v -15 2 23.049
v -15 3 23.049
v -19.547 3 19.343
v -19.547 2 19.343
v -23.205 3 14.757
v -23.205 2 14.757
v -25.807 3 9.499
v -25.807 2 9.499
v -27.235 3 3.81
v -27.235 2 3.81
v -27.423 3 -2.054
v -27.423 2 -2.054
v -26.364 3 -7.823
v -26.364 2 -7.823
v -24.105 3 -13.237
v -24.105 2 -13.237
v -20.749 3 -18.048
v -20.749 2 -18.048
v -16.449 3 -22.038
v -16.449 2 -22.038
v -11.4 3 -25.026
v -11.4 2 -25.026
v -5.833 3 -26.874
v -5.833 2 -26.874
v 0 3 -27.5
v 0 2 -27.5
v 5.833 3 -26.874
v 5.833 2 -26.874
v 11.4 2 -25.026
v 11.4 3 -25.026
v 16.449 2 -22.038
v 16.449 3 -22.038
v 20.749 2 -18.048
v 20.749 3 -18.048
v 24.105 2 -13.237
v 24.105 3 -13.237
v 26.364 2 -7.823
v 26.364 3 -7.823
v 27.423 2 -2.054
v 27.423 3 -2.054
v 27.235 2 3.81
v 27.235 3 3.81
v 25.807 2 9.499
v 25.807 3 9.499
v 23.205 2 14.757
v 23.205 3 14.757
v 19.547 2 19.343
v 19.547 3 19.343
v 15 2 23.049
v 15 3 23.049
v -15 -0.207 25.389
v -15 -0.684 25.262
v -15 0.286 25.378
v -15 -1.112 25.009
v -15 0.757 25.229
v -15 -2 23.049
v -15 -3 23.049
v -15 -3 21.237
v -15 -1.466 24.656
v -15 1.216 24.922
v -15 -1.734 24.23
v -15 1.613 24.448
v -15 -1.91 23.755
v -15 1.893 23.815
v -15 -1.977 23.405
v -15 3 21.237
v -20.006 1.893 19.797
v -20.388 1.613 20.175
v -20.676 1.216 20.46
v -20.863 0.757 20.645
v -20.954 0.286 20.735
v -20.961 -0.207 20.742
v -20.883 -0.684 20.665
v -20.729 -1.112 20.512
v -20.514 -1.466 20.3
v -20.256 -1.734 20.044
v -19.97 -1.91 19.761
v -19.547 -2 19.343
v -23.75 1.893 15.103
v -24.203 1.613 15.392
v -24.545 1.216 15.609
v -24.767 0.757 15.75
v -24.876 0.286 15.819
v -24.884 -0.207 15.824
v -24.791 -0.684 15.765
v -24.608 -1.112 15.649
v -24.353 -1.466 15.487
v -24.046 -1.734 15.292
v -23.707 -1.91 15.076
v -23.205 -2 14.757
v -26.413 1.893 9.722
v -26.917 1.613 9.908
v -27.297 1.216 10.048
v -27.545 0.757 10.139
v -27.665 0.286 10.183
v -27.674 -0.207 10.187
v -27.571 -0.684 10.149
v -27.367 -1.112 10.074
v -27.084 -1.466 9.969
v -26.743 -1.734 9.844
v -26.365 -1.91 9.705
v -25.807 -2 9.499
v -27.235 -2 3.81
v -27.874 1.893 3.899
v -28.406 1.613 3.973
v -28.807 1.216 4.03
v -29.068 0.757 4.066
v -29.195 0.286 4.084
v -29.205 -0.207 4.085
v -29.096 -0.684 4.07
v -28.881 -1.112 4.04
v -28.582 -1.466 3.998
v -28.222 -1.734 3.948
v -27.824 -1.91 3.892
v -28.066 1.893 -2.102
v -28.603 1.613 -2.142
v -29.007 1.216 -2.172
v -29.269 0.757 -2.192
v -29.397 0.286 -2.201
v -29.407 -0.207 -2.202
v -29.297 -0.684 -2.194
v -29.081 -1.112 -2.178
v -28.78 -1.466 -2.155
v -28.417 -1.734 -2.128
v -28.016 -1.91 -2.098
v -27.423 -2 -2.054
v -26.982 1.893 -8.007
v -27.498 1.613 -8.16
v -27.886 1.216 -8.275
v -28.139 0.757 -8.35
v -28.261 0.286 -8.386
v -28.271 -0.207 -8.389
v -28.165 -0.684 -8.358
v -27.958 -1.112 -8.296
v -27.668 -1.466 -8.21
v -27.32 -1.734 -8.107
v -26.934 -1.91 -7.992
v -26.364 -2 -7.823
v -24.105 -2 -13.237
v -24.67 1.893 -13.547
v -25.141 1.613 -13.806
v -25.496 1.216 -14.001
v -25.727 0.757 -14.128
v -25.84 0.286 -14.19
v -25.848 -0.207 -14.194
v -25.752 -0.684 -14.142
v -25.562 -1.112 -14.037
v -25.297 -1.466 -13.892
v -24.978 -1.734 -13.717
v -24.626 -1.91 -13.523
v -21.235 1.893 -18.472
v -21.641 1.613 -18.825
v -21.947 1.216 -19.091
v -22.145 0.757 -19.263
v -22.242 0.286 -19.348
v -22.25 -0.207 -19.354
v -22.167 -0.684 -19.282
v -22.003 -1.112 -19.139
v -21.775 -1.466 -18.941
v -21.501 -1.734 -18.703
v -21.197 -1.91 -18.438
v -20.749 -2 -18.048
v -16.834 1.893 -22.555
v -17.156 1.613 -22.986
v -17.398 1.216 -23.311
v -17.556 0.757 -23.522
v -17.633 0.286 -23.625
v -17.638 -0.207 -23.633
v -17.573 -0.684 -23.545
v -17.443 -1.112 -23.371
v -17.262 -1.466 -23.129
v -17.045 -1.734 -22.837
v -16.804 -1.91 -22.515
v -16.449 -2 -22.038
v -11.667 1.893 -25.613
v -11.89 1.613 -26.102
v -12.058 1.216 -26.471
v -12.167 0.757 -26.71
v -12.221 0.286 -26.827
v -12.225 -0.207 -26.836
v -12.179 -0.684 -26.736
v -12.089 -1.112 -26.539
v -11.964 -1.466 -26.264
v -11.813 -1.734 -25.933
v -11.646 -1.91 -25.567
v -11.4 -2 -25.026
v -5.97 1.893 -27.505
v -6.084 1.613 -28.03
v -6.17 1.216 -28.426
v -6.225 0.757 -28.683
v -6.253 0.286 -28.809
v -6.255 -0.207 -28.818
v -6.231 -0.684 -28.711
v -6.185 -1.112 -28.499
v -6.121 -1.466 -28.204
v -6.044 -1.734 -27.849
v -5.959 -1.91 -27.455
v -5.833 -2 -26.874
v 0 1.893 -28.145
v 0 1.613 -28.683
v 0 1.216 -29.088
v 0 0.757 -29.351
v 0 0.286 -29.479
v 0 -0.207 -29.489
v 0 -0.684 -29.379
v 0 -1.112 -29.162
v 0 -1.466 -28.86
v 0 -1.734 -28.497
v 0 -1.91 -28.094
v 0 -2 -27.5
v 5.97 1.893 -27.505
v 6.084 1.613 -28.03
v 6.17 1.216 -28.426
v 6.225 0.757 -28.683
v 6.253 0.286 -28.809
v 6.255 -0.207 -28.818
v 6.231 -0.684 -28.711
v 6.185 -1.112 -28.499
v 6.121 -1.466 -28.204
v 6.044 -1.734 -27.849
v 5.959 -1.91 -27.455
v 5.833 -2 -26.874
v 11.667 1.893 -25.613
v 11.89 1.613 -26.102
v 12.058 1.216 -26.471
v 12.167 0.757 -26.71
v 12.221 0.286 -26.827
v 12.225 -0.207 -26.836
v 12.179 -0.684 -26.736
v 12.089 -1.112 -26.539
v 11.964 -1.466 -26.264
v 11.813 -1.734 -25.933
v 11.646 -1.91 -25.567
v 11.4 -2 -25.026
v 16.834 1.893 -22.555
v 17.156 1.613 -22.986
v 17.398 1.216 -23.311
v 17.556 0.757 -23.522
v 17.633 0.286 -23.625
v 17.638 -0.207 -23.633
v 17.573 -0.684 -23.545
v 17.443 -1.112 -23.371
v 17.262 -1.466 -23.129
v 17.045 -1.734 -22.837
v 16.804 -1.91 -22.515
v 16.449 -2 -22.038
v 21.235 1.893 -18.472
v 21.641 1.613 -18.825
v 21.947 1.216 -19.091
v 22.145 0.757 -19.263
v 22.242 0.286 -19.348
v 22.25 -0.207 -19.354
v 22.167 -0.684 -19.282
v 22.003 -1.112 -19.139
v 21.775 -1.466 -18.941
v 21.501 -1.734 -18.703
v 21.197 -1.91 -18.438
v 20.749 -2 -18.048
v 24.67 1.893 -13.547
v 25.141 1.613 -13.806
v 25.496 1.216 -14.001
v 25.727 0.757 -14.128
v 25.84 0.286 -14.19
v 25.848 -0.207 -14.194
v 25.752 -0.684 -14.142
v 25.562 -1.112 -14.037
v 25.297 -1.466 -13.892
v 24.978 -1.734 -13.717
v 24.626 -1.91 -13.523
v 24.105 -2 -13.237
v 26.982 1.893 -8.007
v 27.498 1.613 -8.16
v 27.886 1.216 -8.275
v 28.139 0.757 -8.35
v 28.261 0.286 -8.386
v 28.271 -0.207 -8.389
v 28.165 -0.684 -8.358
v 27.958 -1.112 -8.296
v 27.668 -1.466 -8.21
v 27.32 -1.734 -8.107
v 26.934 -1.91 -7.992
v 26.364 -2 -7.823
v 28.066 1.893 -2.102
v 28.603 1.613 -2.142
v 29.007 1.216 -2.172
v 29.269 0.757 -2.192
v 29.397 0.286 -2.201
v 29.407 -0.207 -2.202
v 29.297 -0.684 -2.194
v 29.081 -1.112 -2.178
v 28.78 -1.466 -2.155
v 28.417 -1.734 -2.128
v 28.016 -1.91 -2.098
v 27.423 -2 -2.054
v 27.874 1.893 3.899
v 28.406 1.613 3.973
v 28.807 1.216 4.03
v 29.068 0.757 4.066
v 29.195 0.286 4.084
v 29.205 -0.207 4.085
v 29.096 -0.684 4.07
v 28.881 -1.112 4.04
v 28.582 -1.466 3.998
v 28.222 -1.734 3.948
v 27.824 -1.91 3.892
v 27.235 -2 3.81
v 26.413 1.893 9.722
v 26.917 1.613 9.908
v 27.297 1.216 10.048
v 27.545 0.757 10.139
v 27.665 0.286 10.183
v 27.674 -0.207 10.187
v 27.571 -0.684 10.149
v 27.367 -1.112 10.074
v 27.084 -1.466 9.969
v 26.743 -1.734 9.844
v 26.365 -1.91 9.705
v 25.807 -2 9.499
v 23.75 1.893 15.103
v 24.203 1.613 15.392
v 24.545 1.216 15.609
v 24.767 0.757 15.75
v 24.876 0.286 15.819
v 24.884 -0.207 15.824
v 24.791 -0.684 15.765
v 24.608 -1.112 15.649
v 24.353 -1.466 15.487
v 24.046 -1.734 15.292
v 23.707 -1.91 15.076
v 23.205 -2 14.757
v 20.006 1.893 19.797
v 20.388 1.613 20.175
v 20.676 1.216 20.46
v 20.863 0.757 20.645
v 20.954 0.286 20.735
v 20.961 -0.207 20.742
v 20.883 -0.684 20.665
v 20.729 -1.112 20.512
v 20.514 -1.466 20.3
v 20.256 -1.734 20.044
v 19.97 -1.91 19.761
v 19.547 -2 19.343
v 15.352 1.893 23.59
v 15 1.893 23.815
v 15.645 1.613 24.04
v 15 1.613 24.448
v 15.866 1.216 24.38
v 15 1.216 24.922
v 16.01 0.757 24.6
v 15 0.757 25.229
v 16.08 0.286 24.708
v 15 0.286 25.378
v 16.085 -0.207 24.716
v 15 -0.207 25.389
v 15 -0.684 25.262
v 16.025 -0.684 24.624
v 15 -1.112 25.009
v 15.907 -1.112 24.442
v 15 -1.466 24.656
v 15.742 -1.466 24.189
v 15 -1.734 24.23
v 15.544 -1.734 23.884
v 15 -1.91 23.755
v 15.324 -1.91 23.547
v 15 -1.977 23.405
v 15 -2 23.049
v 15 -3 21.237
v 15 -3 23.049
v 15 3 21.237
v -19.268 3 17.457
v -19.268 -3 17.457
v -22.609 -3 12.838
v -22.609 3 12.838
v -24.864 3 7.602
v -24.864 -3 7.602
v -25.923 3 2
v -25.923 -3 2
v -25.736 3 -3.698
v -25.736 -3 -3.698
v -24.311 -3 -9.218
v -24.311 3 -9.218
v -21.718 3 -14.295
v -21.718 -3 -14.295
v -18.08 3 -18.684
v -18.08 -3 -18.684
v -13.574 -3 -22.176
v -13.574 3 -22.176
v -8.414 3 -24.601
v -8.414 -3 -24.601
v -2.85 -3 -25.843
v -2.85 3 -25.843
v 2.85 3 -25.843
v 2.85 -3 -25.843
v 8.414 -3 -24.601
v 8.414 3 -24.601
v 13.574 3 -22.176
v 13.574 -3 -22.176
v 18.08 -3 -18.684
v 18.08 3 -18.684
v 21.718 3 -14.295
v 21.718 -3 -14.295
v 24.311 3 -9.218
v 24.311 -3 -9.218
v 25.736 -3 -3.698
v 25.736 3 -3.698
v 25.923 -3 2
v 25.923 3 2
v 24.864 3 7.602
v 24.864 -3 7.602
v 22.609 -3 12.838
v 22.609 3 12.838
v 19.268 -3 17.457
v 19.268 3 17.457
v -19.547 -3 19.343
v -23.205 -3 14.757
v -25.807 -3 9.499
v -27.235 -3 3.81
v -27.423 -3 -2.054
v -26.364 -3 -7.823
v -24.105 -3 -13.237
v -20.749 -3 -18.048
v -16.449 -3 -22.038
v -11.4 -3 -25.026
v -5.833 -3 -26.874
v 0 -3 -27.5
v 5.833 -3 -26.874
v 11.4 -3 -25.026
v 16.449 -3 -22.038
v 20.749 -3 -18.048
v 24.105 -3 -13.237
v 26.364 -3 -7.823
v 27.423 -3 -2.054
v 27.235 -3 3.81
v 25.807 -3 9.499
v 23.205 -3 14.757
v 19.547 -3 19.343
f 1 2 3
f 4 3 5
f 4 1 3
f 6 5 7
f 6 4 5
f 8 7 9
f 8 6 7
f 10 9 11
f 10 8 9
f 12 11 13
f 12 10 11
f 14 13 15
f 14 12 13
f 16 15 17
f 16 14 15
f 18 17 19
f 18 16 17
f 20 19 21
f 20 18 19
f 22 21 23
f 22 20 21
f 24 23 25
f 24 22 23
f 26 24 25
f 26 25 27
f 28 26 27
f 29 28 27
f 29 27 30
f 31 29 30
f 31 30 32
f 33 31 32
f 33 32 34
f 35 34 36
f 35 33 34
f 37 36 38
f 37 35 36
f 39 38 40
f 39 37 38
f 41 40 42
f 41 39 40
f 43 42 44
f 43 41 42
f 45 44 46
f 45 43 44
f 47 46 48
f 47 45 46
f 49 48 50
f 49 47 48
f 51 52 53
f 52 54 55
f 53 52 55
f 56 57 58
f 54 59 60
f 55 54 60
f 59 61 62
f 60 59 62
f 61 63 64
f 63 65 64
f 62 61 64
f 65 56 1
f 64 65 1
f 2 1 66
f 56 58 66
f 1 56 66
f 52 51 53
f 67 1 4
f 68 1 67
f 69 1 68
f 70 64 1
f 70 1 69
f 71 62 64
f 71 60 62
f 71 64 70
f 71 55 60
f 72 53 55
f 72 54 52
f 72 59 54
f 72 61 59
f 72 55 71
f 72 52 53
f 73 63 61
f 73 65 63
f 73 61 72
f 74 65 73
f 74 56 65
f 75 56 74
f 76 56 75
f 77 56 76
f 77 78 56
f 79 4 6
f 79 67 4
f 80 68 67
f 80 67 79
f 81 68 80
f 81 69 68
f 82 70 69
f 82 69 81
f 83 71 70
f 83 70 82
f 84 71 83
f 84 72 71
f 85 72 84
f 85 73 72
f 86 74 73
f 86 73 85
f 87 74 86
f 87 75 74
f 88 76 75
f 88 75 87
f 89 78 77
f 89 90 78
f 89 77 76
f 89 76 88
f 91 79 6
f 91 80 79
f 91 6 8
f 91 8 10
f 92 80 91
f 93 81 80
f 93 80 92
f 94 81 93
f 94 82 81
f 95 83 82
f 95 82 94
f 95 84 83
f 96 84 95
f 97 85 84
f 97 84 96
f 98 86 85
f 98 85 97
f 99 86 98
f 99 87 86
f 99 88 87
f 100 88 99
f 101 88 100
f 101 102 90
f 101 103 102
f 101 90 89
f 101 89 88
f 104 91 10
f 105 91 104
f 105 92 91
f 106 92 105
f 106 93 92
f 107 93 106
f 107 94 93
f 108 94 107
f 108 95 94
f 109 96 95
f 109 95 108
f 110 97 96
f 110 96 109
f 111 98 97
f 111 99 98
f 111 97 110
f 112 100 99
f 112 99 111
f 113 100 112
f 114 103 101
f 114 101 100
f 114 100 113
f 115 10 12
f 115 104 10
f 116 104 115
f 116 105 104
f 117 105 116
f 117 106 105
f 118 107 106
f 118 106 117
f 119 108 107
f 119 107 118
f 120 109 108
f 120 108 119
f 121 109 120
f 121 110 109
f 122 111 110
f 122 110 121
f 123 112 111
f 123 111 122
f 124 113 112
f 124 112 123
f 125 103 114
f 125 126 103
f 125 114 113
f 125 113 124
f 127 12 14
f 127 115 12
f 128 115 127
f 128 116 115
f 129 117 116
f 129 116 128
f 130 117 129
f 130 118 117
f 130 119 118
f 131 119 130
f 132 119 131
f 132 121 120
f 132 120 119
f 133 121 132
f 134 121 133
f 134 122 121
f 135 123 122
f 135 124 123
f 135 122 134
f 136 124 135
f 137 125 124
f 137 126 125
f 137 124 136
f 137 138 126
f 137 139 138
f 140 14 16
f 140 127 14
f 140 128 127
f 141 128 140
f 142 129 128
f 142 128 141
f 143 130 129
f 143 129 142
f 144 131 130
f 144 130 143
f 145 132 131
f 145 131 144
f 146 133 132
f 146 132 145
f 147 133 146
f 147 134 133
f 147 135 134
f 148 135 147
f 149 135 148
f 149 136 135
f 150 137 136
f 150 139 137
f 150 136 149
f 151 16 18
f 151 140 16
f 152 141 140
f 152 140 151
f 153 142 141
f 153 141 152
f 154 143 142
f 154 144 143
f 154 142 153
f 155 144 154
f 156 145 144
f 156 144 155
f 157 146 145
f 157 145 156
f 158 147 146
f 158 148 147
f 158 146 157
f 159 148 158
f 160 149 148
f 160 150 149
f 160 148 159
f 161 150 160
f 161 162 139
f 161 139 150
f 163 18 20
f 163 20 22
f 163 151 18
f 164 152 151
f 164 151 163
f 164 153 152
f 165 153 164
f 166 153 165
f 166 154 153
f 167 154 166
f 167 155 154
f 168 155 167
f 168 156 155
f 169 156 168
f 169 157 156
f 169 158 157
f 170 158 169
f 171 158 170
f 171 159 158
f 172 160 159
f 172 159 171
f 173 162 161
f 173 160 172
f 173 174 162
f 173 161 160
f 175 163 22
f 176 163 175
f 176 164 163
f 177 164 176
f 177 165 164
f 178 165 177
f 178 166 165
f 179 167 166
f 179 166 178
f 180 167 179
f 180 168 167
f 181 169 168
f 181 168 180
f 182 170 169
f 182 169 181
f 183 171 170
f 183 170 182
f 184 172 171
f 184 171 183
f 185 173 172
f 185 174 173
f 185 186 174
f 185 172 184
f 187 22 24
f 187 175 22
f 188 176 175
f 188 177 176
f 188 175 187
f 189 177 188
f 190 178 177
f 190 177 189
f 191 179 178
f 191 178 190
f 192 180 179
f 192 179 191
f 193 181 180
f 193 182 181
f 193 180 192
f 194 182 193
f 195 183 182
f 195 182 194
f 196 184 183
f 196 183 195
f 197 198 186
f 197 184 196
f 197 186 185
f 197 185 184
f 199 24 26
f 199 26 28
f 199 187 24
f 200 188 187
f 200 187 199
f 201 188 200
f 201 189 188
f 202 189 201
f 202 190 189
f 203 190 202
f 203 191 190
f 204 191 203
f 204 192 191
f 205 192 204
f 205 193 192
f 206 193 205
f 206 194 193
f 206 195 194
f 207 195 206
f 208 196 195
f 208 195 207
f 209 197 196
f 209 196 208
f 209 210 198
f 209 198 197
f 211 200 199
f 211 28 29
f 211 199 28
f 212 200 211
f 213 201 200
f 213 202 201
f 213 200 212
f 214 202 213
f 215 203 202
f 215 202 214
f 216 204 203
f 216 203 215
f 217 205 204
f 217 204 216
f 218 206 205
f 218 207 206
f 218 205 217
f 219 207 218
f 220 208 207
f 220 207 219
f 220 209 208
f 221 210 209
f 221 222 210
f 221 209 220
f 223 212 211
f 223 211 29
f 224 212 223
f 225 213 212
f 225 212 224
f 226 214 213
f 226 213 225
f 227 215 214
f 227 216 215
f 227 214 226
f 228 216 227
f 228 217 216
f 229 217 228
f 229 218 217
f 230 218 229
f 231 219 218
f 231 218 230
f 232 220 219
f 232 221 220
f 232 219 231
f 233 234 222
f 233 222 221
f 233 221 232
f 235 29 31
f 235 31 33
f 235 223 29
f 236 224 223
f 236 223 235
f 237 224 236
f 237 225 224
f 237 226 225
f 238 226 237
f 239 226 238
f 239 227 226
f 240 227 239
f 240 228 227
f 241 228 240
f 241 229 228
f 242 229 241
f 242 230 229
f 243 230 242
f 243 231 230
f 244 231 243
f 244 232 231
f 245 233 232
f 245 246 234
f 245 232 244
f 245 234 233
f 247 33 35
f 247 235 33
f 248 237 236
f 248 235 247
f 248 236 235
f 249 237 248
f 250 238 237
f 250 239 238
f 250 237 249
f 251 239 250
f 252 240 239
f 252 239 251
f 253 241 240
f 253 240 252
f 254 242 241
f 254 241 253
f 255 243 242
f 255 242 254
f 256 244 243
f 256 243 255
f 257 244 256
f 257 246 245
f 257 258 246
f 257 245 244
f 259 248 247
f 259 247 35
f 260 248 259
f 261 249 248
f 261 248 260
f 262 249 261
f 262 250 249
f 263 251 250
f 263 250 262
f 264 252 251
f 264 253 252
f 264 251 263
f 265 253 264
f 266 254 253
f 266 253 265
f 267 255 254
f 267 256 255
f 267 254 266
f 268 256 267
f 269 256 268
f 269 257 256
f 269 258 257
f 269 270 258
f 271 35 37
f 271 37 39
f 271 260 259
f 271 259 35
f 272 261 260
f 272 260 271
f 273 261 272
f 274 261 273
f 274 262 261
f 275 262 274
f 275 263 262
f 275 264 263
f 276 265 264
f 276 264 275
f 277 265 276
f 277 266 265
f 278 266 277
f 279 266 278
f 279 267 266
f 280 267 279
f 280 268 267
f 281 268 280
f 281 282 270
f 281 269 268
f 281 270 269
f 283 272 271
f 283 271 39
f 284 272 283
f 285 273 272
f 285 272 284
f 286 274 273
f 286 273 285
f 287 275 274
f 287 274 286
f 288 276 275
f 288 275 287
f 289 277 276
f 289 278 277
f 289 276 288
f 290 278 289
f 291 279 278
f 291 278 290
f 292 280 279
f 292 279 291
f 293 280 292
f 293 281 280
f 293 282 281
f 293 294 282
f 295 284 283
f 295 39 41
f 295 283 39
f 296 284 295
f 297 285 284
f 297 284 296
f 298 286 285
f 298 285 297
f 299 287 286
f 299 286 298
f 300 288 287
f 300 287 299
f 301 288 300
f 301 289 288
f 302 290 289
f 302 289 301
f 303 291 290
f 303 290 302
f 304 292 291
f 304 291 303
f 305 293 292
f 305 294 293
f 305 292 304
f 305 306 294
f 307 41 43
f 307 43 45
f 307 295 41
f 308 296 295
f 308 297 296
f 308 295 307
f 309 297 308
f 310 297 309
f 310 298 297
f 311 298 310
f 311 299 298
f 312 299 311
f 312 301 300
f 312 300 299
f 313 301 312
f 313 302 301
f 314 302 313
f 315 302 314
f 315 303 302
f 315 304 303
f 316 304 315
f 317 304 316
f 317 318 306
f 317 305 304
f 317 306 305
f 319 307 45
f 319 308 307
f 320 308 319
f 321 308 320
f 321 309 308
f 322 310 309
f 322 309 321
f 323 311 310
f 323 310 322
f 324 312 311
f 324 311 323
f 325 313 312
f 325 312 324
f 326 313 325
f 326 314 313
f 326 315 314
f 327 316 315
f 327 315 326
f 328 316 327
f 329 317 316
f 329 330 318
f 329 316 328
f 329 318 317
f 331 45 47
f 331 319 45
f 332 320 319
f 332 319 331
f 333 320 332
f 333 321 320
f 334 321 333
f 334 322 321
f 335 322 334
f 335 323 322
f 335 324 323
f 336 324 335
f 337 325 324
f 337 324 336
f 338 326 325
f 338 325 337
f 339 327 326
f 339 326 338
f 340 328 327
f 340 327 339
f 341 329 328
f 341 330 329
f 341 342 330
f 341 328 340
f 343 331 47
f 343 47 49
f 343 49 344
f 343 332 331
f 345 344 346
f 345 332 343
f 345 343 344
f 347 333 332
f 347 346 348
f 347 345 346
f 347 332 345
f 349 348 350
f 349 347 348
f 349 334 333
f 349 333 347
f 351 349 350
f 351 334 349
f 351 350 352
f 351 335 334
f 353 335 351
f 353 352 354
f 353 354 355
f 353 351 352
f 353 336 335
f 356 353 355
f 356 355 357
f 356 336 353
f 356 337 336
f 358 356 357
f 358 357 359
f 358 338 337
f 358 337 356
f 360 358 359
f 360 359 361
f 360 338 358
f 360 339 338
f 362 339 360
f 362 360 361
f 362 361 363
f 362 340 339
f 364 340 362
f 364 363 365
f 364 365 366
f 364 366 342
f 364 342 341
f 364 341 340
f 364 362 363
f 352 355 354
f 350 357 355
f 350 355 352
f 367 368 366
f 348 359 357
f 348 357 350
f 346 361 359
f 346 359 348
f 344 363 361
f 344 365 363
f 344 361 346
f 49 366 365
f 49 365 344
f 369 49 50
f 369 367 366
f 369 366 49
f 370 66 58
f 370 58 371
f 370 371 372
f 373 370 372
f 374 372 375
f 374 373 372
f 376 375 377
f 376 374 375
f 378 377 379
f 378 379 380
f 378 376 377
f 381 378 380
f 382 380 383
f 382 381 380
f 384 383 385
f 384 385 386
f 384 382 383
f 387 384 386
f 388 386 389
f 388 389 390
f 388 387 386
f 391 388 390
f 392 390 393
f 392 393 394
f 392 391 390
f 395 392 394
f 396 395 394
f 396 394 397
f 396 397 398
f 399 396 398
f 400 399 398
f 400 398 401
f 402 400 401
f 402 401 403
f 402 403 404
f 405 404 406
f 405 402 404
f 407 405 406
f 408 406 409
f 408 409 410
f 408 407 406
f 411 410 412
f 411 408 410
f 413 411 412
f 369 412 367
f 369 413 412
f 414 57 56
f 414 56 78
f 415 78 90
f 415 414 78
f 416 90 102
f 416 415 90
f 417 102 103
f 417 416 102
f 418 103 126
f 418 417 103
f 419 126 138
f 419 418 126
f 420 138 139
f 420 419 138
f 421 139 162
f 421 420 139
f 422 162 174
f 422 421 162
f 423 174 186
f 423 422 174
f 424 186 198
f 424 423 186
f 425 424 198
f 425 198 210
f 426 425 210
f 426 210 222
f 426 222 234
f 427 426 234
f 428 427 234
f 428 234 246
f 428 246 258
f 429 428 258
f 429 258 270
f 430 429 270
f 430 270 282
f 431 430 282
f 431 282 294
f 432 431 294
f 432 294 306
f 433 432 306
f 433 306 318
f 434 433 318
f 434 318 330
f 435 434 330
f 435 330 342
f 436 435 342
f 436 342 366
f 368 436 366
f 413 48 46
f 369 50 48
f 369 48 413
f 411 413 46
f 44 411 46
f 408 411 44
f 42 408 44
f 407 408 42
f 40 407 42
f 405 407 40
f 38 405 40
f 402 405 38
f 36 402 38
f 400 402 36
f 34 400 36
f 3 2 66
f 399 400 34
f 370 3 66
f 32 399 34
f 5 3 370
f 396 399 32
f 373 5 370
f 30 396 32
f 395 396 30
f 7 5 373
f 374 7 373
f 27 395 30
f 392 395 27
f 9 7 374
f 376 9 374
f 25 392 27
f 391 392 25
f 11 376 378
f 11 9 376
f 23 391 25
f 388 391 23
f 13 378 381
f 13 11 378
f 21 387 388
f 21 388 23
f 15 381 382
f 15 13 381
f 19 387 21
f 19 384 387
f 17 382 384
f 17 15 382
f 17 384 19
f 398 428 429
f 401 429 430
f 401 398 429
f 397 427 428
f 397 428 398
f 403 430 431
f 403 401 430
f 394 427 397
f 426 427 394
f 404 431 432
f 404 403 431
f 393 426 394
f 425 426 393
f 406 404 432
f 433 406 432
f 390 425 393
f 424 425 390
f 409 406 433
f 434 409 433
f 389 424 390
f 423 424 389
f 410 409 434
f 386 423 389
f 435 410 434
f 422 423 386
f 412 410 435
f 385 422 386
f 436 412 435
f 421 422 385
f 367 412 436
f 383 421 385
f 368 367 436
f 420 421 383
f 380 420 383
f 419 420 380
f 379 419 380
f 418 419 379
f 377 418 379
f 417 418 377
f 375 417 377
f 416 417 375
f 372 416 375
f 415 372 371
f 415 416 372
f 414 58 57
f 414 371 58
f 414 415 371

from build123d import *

# Parameters (mm, degrees)
SKETCH3_W          = 30
SKETCH3_H          = 6
CUT_EXTRUDE1_DEPTH = 42.827024898


with BuildPart() as part:
    # Sketch1 → Revolve1 (revolve)
    with BuildSketch(Plane.XY, mode=Mode.PRIVATE) as revolve1_sk:
        with BuildLine():
            Line((-26, -3), (-26, 3))
            Line((-26, 3), (-27.5, 3))
            Line((-27.5, 3), (-27.5, 2))
            ThreePointArc((-27.5, 2), (-29.5, 0), (-27.5, -2))
            Line((-27.5, -2), (-27.5, -3))
            Line((-27.5, -3), (-26, -3))
        make_face()
    revolve(revolve1_sk.sketch.rotate(Axis((0, 27.580200319, 0), (0, -1, 0)), 270), axis=Axis((0, 27.580200319, 0), (0, -1, 0)))

    # Sketch3 → Cut-Extrude1 (cut, through all)
    with BuildSketch(Plane.XY):
        Rectangle(SKETCH3_W, SKETCH3_H)
    extrude(amount=CUT_EXTRUDE1_DEPTH, mode=Mode.SUBTRACT)


solid = part.part
